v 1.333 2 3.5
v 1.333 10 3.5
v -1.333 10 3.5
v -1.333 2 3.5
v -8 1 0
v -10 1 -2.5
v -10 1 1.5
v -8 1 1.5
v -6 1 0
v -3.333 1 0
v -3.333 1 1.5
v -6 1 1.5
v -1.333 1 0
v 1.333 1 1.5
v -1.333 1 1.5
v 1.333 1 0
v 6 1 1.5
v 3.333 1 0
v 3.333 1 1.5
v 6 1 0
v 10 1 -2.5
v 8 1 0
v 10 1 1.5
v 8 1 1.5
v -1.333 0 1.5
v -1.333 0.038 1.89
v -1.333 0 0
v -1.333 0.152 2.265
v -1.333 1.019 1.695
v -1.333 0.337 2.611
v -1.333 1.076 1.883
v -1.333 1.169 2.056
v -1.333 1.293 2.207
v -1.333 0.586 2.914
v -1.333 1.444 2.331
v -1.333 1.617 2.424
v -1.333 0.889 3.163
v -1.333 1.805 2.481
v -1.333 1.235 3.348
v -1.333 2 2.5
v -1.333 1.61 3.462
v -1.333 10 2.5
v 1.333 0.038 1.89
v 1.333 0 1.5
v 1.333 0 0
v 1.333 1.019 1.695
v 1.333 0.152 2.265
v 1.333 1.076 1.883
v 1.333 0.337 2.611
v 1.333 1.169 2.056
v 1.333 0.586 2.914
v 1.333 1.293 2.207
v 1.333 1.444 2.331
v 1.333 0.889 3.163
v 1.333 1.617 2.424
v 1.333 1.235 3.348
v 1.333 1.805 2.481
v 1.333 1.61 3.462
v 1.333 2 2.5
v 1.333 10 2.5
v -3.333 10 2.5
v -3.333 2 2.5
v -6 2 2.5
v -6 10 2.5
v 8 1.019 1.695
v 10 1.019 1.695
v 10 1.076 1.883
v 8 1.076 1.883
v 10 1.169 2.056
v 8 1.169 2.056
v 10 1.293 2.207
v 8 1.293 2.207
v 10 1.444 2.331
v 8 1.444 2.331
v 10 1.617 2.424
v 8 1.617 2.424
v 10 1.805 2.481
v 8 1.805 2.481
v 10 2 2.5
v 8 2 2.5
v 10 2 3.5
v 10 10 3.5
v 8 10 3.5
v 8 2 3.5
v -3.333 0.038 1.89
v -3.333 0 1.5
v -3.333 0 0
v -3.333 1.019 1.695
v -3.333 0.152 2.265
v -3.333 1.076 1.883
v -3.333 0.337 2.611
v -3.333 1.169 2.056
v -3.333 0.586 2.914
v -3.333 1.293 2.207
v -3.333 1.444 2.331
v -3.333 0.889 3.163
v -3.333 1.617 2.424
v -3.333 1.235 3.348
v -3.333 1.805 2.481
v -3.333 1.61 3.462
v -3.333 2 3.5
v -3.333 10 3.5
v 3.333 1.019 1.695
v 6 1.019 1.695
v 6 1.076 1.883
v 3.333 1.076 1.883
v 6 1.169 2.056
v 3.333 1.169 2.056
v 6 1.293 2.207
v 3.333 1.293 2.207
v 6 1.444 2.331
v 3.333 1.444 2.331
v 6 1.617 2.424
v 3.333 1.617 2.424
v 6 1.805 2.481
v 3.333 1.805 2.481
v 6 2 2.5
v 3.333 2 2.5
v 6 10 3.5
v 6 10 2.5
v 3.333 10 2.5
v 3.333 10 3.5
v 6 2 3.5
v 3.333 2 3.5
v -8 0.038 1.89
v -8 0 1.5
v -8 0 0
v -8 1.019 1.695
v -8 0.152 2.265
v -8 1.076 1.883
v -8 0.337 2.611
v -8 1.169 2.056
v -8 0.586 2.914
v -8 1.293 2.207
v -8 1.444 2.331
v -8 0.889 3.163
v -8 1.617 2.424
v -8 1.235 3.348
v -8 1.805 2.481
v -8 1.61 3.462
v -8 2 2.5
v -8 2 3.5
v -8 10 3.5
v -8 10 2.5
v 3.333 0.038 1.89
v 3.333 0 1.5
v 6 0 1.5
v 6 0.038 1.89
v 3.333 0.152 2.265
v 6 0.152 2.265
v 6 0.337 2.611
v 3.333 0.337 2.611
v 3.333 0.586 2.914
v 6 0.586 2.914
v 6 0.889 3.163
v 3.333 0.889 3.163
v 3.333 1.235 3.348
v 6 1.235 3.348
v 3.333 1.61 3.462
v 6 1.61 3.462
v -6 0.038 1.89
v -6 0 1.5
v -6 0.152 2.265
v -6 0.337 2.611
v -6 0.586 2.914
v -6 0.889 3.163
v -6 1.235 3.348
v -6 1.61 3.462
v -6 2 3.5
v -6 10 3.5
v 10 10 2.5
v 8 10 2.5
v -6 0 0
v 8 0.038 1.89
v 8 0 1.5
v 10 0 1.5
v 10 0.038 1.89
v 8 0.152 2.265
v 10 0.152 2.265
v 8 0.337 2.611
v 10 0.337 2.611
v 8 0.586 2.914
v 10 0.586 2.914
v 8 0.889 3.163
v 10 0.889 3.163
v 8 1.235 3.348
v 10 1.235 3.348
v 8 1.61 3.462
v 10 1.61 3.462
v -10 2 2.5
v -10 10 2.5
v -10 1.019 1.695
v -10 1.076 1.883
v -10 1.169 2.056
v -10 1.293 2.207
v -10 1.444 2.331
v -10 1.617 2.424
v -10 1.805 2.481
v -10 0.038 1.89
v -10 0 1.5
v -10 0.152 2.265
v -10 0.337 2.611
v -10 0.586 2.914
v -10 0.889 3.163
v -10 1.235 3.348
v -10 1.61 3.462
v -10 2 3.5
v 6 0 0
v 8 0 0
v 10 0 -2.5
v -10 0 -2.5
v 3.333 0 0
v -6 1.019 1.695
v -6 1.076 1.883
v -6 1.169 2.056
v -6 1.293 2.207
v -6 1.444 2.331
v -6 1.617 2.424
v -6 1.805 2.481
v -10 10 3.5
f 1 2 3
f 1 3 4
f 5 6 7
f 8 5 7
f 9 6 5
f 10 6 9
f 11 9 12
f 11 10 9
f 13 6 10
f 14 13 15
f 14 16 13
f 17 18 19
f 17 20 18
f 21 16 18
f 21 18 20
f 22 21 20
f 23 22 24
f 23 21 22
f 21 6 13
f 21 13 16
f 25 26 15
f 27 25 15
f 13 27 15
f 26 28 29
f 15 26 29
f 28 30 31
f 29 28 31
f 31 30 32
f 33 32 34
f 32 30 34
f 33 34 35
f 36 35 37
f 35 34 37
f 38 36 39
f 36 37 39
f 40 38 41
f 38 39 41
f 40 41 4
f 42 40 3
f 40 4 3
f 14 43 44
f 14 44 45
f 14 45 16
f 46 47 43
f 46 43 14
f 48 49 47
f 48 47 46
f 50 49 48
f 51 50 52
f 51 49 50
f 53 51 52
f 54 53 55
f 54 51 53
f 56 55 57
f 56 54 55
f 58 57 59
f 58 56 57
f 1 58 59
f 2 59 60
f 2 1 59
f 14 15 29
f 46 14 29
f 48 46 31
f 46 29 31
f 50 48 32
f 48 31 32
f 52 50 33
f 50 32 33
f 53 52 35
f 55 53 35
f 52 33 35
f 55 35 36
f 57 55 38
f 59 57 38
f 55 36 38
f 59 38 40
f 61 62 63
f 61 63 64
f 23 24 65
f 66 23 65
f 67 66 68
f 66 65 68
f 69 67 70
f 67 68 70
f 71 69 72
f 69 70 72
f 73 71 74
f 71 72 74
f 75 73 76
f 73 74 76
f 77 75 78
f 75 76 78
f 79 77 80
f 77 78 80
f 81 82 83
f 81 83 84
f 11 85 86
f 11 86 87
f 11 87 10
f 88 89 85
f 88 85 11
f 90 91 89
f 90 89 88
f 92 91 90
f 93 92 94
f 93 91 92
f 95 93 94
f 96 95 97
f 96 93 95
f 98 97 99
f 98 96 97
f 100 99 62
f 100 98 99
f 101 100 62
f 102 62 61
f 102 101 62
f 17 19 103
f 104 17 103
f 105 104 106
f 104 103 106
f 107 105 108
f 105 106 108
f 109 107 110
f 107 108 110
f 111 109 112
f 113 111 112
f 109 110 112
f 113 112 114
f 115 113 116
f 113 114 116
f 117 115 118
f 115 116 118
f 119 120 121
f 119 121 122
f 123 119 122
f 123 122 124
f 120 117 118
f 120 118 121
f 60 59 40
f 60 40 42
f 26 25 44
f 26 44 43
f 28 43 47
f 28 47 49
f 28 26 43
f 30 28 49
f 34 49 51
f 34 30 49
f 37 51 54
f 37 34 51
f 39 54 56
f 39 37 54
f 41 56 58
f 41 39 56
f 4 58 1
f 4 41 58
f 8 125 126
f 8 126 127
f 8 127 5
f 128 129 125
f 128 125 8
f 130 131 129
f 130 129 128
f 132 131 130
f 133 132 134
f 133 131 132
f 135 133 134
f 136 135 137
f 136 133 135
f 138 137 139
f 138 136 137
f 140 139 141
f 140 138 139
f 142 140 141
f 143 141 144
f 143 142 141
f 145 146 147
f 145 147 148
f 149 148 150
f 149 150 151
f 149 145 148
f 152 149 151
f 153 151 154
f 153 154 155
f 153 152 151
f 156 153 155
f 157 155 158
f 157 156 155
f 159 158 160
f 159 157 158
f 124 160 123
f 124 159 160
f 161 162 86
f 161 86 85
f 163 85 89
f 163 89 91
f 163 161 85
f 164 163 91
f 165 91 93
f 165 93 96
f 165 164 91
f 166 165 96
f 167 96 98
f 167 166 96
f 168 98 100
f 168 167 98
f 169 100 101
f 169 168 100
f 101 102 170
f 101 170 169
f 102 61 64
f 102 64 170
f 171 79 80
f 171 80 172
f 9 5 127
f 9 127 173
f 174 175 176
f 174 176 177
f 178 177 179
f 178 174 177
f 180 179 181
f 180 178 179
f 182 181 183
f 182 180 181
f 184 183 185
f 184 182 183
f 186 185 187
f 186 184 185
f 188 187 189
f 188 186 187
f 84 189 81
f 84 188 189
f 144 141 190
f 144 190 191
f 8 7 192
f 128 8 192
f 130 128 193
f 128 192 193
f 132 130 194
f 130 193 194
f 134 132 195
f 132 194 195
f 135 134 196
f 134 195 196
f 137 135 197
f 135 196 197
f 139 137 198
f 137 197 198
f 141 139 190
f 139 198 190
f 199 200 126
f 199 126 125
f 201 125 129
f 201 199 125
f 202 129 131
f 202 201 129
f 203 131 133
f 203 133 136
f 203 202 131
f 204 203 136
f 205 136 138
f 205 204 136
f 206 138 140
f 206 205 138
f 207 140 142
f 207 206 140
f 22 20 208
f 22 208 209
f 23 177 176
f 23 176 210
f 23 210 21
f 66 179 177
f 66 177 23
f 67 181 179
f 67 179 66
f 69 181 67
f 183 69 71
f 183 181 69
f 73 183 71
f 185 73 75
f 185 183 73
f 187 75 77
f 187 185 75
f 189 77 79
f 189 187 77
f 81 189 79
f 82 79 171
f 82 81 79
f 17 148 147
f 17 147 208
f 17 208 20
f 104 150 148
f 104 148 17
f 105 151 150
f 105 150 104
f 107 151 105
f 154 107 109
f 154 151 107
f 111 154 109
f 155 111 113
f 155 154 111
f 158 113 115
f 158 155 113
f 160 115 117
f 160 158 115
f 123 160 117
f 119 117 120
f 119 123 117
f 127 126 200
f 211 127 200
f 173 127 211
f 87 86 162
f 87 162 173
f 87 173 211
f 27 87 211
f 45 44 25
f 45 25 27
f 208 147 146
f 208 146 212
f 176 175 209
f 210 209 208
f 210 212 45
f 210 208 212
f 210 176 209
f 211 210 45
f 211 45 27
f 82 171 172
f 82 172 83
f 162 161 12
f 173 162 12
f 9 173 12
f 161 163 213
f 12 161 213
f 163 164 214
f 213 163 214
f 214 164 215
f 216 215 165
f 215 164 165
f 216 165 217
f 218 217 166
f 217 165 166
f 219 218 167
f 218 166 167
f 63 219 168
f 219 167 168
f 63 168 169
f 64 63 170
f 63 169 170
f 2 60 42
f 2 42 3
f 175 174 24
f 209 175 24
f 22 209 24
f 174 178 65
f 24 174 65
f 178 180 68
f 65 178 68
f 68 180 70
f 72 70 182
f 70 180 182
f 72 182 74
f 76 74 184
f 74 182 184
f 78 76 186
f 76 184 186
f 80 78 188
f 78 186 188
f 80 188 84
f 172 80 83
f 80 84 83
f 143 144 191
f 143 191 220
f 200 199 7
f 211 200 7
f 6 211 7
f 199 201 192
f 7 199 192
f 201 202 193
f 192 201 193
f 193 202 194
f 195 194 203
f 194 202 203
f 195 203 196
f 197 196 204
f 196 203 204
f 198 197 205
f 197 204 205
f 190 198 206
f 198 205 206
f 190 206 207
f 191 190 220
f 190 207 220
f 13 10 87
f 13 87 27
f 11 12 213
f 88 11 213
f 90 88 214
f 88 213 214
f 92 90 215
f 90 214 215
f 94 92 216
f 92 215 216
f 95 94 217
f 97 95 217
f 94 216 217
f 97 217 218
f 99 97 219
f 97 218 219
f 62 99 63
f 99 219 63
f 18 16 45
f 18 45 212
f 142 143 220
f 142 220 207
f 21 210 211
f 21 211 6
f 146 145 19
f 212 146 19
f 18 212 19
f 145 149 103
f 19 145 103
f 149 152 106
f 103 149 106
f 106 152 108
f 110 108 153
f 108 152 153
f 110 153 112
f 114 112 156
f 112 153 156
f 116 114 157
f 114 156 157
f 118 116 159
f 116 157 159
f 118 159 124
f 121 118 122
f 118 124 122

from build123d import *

# Parameters (mm, degrees)
VYSUNOUT_TENKOST_NN_1_DEPTH = 10
P_EV_ST_OBJEM1_START        = -10
P_EV_ST_OBJEM1_DEPTH        = 20
P_EV_ST_OBJEM1_2_DEPTH      = 20
SKICA10_W                   = 2
SKICA10_H                   = 10
ODEBRAT_VYSUNUT_M3_DEPTH    = 3.5


# Read off the part's stored shape, not the designer's step: Převést-Objem1
with BuildPart() as part:
    # Skica1 → Vysunout tenkostěnný1 (new, symmetric)
    with BuildSketch(Plane(origin=(0, 0, 0), x_dir=(0, 0, -1), z_dir=(1, 0, 0))):
        Polygon((-3.5, 10), (-3.5, 0), (2.5, 0), (2.5, 1), (-2.5, 1), (-2.5, 10), align=None)
    extrude(amount=VYSUNOUT_TENKOST_NN_1_DEPTH, both=True)

    # Převést-Objem1 outline → Převést-Objem1 (cut)
    with BuildSketch(Plane.YZ.offset(P_EV_ST_OBJEM1_START)):
        with BuildLine():
            Line((0, 3.5), (0, 1.5))
            ThreePointArc((0, 1.5), (0.585786438, 2.914213562), (2, 3.5))
            Line((2, 3.5), (0, 3.5))
        make_face()
    extrude(amount=P_EV_ST_OBJEM1_DEPTH, mode=Mode.SUBTRACT)

    # P_ev_st-Objem1 2 outline → P_ev_st-Objem1 2 (add)
    with BuildSketch(Plane.YZ.offset(P_EV_ST_OBJEM1_START)):
        with BuildLine():
            Line((1, 2.5), (1, 1.5))
            ThreePointArc((1, 1.5), (1.292893219, 2.207106781), (2, 2.5))
            Line((2, 2.5), (1, 2.5))
        make_face()
    extrude(amount=P_EV_ST_OBJEM1_2_DEPTH)

    # Skica10 → Odebrat vysunutím3 (cut)
    with BuildSketch(Plane.XY.offset(3.5)):
        with Locations((-7, 5)):
            Rectangle(SKICA10_W, SKICA10_H)
        with Locations((-2.333333333, 5)):
            Rectangle(SKICA10_W, SKICA10_H)
        with Locations((2.333333333, 5)):
            Rectangle(SKICA10_W, SKICA10_H)
        with Locations((7, 5)):
            Rectangle(SKICA10_W, SKICA10_H)
    extrude(amount=-ODEBRAT_VYSUNUT_M3_DEPTH, mode=Mode.SUBTRACT)


solid = part.part
